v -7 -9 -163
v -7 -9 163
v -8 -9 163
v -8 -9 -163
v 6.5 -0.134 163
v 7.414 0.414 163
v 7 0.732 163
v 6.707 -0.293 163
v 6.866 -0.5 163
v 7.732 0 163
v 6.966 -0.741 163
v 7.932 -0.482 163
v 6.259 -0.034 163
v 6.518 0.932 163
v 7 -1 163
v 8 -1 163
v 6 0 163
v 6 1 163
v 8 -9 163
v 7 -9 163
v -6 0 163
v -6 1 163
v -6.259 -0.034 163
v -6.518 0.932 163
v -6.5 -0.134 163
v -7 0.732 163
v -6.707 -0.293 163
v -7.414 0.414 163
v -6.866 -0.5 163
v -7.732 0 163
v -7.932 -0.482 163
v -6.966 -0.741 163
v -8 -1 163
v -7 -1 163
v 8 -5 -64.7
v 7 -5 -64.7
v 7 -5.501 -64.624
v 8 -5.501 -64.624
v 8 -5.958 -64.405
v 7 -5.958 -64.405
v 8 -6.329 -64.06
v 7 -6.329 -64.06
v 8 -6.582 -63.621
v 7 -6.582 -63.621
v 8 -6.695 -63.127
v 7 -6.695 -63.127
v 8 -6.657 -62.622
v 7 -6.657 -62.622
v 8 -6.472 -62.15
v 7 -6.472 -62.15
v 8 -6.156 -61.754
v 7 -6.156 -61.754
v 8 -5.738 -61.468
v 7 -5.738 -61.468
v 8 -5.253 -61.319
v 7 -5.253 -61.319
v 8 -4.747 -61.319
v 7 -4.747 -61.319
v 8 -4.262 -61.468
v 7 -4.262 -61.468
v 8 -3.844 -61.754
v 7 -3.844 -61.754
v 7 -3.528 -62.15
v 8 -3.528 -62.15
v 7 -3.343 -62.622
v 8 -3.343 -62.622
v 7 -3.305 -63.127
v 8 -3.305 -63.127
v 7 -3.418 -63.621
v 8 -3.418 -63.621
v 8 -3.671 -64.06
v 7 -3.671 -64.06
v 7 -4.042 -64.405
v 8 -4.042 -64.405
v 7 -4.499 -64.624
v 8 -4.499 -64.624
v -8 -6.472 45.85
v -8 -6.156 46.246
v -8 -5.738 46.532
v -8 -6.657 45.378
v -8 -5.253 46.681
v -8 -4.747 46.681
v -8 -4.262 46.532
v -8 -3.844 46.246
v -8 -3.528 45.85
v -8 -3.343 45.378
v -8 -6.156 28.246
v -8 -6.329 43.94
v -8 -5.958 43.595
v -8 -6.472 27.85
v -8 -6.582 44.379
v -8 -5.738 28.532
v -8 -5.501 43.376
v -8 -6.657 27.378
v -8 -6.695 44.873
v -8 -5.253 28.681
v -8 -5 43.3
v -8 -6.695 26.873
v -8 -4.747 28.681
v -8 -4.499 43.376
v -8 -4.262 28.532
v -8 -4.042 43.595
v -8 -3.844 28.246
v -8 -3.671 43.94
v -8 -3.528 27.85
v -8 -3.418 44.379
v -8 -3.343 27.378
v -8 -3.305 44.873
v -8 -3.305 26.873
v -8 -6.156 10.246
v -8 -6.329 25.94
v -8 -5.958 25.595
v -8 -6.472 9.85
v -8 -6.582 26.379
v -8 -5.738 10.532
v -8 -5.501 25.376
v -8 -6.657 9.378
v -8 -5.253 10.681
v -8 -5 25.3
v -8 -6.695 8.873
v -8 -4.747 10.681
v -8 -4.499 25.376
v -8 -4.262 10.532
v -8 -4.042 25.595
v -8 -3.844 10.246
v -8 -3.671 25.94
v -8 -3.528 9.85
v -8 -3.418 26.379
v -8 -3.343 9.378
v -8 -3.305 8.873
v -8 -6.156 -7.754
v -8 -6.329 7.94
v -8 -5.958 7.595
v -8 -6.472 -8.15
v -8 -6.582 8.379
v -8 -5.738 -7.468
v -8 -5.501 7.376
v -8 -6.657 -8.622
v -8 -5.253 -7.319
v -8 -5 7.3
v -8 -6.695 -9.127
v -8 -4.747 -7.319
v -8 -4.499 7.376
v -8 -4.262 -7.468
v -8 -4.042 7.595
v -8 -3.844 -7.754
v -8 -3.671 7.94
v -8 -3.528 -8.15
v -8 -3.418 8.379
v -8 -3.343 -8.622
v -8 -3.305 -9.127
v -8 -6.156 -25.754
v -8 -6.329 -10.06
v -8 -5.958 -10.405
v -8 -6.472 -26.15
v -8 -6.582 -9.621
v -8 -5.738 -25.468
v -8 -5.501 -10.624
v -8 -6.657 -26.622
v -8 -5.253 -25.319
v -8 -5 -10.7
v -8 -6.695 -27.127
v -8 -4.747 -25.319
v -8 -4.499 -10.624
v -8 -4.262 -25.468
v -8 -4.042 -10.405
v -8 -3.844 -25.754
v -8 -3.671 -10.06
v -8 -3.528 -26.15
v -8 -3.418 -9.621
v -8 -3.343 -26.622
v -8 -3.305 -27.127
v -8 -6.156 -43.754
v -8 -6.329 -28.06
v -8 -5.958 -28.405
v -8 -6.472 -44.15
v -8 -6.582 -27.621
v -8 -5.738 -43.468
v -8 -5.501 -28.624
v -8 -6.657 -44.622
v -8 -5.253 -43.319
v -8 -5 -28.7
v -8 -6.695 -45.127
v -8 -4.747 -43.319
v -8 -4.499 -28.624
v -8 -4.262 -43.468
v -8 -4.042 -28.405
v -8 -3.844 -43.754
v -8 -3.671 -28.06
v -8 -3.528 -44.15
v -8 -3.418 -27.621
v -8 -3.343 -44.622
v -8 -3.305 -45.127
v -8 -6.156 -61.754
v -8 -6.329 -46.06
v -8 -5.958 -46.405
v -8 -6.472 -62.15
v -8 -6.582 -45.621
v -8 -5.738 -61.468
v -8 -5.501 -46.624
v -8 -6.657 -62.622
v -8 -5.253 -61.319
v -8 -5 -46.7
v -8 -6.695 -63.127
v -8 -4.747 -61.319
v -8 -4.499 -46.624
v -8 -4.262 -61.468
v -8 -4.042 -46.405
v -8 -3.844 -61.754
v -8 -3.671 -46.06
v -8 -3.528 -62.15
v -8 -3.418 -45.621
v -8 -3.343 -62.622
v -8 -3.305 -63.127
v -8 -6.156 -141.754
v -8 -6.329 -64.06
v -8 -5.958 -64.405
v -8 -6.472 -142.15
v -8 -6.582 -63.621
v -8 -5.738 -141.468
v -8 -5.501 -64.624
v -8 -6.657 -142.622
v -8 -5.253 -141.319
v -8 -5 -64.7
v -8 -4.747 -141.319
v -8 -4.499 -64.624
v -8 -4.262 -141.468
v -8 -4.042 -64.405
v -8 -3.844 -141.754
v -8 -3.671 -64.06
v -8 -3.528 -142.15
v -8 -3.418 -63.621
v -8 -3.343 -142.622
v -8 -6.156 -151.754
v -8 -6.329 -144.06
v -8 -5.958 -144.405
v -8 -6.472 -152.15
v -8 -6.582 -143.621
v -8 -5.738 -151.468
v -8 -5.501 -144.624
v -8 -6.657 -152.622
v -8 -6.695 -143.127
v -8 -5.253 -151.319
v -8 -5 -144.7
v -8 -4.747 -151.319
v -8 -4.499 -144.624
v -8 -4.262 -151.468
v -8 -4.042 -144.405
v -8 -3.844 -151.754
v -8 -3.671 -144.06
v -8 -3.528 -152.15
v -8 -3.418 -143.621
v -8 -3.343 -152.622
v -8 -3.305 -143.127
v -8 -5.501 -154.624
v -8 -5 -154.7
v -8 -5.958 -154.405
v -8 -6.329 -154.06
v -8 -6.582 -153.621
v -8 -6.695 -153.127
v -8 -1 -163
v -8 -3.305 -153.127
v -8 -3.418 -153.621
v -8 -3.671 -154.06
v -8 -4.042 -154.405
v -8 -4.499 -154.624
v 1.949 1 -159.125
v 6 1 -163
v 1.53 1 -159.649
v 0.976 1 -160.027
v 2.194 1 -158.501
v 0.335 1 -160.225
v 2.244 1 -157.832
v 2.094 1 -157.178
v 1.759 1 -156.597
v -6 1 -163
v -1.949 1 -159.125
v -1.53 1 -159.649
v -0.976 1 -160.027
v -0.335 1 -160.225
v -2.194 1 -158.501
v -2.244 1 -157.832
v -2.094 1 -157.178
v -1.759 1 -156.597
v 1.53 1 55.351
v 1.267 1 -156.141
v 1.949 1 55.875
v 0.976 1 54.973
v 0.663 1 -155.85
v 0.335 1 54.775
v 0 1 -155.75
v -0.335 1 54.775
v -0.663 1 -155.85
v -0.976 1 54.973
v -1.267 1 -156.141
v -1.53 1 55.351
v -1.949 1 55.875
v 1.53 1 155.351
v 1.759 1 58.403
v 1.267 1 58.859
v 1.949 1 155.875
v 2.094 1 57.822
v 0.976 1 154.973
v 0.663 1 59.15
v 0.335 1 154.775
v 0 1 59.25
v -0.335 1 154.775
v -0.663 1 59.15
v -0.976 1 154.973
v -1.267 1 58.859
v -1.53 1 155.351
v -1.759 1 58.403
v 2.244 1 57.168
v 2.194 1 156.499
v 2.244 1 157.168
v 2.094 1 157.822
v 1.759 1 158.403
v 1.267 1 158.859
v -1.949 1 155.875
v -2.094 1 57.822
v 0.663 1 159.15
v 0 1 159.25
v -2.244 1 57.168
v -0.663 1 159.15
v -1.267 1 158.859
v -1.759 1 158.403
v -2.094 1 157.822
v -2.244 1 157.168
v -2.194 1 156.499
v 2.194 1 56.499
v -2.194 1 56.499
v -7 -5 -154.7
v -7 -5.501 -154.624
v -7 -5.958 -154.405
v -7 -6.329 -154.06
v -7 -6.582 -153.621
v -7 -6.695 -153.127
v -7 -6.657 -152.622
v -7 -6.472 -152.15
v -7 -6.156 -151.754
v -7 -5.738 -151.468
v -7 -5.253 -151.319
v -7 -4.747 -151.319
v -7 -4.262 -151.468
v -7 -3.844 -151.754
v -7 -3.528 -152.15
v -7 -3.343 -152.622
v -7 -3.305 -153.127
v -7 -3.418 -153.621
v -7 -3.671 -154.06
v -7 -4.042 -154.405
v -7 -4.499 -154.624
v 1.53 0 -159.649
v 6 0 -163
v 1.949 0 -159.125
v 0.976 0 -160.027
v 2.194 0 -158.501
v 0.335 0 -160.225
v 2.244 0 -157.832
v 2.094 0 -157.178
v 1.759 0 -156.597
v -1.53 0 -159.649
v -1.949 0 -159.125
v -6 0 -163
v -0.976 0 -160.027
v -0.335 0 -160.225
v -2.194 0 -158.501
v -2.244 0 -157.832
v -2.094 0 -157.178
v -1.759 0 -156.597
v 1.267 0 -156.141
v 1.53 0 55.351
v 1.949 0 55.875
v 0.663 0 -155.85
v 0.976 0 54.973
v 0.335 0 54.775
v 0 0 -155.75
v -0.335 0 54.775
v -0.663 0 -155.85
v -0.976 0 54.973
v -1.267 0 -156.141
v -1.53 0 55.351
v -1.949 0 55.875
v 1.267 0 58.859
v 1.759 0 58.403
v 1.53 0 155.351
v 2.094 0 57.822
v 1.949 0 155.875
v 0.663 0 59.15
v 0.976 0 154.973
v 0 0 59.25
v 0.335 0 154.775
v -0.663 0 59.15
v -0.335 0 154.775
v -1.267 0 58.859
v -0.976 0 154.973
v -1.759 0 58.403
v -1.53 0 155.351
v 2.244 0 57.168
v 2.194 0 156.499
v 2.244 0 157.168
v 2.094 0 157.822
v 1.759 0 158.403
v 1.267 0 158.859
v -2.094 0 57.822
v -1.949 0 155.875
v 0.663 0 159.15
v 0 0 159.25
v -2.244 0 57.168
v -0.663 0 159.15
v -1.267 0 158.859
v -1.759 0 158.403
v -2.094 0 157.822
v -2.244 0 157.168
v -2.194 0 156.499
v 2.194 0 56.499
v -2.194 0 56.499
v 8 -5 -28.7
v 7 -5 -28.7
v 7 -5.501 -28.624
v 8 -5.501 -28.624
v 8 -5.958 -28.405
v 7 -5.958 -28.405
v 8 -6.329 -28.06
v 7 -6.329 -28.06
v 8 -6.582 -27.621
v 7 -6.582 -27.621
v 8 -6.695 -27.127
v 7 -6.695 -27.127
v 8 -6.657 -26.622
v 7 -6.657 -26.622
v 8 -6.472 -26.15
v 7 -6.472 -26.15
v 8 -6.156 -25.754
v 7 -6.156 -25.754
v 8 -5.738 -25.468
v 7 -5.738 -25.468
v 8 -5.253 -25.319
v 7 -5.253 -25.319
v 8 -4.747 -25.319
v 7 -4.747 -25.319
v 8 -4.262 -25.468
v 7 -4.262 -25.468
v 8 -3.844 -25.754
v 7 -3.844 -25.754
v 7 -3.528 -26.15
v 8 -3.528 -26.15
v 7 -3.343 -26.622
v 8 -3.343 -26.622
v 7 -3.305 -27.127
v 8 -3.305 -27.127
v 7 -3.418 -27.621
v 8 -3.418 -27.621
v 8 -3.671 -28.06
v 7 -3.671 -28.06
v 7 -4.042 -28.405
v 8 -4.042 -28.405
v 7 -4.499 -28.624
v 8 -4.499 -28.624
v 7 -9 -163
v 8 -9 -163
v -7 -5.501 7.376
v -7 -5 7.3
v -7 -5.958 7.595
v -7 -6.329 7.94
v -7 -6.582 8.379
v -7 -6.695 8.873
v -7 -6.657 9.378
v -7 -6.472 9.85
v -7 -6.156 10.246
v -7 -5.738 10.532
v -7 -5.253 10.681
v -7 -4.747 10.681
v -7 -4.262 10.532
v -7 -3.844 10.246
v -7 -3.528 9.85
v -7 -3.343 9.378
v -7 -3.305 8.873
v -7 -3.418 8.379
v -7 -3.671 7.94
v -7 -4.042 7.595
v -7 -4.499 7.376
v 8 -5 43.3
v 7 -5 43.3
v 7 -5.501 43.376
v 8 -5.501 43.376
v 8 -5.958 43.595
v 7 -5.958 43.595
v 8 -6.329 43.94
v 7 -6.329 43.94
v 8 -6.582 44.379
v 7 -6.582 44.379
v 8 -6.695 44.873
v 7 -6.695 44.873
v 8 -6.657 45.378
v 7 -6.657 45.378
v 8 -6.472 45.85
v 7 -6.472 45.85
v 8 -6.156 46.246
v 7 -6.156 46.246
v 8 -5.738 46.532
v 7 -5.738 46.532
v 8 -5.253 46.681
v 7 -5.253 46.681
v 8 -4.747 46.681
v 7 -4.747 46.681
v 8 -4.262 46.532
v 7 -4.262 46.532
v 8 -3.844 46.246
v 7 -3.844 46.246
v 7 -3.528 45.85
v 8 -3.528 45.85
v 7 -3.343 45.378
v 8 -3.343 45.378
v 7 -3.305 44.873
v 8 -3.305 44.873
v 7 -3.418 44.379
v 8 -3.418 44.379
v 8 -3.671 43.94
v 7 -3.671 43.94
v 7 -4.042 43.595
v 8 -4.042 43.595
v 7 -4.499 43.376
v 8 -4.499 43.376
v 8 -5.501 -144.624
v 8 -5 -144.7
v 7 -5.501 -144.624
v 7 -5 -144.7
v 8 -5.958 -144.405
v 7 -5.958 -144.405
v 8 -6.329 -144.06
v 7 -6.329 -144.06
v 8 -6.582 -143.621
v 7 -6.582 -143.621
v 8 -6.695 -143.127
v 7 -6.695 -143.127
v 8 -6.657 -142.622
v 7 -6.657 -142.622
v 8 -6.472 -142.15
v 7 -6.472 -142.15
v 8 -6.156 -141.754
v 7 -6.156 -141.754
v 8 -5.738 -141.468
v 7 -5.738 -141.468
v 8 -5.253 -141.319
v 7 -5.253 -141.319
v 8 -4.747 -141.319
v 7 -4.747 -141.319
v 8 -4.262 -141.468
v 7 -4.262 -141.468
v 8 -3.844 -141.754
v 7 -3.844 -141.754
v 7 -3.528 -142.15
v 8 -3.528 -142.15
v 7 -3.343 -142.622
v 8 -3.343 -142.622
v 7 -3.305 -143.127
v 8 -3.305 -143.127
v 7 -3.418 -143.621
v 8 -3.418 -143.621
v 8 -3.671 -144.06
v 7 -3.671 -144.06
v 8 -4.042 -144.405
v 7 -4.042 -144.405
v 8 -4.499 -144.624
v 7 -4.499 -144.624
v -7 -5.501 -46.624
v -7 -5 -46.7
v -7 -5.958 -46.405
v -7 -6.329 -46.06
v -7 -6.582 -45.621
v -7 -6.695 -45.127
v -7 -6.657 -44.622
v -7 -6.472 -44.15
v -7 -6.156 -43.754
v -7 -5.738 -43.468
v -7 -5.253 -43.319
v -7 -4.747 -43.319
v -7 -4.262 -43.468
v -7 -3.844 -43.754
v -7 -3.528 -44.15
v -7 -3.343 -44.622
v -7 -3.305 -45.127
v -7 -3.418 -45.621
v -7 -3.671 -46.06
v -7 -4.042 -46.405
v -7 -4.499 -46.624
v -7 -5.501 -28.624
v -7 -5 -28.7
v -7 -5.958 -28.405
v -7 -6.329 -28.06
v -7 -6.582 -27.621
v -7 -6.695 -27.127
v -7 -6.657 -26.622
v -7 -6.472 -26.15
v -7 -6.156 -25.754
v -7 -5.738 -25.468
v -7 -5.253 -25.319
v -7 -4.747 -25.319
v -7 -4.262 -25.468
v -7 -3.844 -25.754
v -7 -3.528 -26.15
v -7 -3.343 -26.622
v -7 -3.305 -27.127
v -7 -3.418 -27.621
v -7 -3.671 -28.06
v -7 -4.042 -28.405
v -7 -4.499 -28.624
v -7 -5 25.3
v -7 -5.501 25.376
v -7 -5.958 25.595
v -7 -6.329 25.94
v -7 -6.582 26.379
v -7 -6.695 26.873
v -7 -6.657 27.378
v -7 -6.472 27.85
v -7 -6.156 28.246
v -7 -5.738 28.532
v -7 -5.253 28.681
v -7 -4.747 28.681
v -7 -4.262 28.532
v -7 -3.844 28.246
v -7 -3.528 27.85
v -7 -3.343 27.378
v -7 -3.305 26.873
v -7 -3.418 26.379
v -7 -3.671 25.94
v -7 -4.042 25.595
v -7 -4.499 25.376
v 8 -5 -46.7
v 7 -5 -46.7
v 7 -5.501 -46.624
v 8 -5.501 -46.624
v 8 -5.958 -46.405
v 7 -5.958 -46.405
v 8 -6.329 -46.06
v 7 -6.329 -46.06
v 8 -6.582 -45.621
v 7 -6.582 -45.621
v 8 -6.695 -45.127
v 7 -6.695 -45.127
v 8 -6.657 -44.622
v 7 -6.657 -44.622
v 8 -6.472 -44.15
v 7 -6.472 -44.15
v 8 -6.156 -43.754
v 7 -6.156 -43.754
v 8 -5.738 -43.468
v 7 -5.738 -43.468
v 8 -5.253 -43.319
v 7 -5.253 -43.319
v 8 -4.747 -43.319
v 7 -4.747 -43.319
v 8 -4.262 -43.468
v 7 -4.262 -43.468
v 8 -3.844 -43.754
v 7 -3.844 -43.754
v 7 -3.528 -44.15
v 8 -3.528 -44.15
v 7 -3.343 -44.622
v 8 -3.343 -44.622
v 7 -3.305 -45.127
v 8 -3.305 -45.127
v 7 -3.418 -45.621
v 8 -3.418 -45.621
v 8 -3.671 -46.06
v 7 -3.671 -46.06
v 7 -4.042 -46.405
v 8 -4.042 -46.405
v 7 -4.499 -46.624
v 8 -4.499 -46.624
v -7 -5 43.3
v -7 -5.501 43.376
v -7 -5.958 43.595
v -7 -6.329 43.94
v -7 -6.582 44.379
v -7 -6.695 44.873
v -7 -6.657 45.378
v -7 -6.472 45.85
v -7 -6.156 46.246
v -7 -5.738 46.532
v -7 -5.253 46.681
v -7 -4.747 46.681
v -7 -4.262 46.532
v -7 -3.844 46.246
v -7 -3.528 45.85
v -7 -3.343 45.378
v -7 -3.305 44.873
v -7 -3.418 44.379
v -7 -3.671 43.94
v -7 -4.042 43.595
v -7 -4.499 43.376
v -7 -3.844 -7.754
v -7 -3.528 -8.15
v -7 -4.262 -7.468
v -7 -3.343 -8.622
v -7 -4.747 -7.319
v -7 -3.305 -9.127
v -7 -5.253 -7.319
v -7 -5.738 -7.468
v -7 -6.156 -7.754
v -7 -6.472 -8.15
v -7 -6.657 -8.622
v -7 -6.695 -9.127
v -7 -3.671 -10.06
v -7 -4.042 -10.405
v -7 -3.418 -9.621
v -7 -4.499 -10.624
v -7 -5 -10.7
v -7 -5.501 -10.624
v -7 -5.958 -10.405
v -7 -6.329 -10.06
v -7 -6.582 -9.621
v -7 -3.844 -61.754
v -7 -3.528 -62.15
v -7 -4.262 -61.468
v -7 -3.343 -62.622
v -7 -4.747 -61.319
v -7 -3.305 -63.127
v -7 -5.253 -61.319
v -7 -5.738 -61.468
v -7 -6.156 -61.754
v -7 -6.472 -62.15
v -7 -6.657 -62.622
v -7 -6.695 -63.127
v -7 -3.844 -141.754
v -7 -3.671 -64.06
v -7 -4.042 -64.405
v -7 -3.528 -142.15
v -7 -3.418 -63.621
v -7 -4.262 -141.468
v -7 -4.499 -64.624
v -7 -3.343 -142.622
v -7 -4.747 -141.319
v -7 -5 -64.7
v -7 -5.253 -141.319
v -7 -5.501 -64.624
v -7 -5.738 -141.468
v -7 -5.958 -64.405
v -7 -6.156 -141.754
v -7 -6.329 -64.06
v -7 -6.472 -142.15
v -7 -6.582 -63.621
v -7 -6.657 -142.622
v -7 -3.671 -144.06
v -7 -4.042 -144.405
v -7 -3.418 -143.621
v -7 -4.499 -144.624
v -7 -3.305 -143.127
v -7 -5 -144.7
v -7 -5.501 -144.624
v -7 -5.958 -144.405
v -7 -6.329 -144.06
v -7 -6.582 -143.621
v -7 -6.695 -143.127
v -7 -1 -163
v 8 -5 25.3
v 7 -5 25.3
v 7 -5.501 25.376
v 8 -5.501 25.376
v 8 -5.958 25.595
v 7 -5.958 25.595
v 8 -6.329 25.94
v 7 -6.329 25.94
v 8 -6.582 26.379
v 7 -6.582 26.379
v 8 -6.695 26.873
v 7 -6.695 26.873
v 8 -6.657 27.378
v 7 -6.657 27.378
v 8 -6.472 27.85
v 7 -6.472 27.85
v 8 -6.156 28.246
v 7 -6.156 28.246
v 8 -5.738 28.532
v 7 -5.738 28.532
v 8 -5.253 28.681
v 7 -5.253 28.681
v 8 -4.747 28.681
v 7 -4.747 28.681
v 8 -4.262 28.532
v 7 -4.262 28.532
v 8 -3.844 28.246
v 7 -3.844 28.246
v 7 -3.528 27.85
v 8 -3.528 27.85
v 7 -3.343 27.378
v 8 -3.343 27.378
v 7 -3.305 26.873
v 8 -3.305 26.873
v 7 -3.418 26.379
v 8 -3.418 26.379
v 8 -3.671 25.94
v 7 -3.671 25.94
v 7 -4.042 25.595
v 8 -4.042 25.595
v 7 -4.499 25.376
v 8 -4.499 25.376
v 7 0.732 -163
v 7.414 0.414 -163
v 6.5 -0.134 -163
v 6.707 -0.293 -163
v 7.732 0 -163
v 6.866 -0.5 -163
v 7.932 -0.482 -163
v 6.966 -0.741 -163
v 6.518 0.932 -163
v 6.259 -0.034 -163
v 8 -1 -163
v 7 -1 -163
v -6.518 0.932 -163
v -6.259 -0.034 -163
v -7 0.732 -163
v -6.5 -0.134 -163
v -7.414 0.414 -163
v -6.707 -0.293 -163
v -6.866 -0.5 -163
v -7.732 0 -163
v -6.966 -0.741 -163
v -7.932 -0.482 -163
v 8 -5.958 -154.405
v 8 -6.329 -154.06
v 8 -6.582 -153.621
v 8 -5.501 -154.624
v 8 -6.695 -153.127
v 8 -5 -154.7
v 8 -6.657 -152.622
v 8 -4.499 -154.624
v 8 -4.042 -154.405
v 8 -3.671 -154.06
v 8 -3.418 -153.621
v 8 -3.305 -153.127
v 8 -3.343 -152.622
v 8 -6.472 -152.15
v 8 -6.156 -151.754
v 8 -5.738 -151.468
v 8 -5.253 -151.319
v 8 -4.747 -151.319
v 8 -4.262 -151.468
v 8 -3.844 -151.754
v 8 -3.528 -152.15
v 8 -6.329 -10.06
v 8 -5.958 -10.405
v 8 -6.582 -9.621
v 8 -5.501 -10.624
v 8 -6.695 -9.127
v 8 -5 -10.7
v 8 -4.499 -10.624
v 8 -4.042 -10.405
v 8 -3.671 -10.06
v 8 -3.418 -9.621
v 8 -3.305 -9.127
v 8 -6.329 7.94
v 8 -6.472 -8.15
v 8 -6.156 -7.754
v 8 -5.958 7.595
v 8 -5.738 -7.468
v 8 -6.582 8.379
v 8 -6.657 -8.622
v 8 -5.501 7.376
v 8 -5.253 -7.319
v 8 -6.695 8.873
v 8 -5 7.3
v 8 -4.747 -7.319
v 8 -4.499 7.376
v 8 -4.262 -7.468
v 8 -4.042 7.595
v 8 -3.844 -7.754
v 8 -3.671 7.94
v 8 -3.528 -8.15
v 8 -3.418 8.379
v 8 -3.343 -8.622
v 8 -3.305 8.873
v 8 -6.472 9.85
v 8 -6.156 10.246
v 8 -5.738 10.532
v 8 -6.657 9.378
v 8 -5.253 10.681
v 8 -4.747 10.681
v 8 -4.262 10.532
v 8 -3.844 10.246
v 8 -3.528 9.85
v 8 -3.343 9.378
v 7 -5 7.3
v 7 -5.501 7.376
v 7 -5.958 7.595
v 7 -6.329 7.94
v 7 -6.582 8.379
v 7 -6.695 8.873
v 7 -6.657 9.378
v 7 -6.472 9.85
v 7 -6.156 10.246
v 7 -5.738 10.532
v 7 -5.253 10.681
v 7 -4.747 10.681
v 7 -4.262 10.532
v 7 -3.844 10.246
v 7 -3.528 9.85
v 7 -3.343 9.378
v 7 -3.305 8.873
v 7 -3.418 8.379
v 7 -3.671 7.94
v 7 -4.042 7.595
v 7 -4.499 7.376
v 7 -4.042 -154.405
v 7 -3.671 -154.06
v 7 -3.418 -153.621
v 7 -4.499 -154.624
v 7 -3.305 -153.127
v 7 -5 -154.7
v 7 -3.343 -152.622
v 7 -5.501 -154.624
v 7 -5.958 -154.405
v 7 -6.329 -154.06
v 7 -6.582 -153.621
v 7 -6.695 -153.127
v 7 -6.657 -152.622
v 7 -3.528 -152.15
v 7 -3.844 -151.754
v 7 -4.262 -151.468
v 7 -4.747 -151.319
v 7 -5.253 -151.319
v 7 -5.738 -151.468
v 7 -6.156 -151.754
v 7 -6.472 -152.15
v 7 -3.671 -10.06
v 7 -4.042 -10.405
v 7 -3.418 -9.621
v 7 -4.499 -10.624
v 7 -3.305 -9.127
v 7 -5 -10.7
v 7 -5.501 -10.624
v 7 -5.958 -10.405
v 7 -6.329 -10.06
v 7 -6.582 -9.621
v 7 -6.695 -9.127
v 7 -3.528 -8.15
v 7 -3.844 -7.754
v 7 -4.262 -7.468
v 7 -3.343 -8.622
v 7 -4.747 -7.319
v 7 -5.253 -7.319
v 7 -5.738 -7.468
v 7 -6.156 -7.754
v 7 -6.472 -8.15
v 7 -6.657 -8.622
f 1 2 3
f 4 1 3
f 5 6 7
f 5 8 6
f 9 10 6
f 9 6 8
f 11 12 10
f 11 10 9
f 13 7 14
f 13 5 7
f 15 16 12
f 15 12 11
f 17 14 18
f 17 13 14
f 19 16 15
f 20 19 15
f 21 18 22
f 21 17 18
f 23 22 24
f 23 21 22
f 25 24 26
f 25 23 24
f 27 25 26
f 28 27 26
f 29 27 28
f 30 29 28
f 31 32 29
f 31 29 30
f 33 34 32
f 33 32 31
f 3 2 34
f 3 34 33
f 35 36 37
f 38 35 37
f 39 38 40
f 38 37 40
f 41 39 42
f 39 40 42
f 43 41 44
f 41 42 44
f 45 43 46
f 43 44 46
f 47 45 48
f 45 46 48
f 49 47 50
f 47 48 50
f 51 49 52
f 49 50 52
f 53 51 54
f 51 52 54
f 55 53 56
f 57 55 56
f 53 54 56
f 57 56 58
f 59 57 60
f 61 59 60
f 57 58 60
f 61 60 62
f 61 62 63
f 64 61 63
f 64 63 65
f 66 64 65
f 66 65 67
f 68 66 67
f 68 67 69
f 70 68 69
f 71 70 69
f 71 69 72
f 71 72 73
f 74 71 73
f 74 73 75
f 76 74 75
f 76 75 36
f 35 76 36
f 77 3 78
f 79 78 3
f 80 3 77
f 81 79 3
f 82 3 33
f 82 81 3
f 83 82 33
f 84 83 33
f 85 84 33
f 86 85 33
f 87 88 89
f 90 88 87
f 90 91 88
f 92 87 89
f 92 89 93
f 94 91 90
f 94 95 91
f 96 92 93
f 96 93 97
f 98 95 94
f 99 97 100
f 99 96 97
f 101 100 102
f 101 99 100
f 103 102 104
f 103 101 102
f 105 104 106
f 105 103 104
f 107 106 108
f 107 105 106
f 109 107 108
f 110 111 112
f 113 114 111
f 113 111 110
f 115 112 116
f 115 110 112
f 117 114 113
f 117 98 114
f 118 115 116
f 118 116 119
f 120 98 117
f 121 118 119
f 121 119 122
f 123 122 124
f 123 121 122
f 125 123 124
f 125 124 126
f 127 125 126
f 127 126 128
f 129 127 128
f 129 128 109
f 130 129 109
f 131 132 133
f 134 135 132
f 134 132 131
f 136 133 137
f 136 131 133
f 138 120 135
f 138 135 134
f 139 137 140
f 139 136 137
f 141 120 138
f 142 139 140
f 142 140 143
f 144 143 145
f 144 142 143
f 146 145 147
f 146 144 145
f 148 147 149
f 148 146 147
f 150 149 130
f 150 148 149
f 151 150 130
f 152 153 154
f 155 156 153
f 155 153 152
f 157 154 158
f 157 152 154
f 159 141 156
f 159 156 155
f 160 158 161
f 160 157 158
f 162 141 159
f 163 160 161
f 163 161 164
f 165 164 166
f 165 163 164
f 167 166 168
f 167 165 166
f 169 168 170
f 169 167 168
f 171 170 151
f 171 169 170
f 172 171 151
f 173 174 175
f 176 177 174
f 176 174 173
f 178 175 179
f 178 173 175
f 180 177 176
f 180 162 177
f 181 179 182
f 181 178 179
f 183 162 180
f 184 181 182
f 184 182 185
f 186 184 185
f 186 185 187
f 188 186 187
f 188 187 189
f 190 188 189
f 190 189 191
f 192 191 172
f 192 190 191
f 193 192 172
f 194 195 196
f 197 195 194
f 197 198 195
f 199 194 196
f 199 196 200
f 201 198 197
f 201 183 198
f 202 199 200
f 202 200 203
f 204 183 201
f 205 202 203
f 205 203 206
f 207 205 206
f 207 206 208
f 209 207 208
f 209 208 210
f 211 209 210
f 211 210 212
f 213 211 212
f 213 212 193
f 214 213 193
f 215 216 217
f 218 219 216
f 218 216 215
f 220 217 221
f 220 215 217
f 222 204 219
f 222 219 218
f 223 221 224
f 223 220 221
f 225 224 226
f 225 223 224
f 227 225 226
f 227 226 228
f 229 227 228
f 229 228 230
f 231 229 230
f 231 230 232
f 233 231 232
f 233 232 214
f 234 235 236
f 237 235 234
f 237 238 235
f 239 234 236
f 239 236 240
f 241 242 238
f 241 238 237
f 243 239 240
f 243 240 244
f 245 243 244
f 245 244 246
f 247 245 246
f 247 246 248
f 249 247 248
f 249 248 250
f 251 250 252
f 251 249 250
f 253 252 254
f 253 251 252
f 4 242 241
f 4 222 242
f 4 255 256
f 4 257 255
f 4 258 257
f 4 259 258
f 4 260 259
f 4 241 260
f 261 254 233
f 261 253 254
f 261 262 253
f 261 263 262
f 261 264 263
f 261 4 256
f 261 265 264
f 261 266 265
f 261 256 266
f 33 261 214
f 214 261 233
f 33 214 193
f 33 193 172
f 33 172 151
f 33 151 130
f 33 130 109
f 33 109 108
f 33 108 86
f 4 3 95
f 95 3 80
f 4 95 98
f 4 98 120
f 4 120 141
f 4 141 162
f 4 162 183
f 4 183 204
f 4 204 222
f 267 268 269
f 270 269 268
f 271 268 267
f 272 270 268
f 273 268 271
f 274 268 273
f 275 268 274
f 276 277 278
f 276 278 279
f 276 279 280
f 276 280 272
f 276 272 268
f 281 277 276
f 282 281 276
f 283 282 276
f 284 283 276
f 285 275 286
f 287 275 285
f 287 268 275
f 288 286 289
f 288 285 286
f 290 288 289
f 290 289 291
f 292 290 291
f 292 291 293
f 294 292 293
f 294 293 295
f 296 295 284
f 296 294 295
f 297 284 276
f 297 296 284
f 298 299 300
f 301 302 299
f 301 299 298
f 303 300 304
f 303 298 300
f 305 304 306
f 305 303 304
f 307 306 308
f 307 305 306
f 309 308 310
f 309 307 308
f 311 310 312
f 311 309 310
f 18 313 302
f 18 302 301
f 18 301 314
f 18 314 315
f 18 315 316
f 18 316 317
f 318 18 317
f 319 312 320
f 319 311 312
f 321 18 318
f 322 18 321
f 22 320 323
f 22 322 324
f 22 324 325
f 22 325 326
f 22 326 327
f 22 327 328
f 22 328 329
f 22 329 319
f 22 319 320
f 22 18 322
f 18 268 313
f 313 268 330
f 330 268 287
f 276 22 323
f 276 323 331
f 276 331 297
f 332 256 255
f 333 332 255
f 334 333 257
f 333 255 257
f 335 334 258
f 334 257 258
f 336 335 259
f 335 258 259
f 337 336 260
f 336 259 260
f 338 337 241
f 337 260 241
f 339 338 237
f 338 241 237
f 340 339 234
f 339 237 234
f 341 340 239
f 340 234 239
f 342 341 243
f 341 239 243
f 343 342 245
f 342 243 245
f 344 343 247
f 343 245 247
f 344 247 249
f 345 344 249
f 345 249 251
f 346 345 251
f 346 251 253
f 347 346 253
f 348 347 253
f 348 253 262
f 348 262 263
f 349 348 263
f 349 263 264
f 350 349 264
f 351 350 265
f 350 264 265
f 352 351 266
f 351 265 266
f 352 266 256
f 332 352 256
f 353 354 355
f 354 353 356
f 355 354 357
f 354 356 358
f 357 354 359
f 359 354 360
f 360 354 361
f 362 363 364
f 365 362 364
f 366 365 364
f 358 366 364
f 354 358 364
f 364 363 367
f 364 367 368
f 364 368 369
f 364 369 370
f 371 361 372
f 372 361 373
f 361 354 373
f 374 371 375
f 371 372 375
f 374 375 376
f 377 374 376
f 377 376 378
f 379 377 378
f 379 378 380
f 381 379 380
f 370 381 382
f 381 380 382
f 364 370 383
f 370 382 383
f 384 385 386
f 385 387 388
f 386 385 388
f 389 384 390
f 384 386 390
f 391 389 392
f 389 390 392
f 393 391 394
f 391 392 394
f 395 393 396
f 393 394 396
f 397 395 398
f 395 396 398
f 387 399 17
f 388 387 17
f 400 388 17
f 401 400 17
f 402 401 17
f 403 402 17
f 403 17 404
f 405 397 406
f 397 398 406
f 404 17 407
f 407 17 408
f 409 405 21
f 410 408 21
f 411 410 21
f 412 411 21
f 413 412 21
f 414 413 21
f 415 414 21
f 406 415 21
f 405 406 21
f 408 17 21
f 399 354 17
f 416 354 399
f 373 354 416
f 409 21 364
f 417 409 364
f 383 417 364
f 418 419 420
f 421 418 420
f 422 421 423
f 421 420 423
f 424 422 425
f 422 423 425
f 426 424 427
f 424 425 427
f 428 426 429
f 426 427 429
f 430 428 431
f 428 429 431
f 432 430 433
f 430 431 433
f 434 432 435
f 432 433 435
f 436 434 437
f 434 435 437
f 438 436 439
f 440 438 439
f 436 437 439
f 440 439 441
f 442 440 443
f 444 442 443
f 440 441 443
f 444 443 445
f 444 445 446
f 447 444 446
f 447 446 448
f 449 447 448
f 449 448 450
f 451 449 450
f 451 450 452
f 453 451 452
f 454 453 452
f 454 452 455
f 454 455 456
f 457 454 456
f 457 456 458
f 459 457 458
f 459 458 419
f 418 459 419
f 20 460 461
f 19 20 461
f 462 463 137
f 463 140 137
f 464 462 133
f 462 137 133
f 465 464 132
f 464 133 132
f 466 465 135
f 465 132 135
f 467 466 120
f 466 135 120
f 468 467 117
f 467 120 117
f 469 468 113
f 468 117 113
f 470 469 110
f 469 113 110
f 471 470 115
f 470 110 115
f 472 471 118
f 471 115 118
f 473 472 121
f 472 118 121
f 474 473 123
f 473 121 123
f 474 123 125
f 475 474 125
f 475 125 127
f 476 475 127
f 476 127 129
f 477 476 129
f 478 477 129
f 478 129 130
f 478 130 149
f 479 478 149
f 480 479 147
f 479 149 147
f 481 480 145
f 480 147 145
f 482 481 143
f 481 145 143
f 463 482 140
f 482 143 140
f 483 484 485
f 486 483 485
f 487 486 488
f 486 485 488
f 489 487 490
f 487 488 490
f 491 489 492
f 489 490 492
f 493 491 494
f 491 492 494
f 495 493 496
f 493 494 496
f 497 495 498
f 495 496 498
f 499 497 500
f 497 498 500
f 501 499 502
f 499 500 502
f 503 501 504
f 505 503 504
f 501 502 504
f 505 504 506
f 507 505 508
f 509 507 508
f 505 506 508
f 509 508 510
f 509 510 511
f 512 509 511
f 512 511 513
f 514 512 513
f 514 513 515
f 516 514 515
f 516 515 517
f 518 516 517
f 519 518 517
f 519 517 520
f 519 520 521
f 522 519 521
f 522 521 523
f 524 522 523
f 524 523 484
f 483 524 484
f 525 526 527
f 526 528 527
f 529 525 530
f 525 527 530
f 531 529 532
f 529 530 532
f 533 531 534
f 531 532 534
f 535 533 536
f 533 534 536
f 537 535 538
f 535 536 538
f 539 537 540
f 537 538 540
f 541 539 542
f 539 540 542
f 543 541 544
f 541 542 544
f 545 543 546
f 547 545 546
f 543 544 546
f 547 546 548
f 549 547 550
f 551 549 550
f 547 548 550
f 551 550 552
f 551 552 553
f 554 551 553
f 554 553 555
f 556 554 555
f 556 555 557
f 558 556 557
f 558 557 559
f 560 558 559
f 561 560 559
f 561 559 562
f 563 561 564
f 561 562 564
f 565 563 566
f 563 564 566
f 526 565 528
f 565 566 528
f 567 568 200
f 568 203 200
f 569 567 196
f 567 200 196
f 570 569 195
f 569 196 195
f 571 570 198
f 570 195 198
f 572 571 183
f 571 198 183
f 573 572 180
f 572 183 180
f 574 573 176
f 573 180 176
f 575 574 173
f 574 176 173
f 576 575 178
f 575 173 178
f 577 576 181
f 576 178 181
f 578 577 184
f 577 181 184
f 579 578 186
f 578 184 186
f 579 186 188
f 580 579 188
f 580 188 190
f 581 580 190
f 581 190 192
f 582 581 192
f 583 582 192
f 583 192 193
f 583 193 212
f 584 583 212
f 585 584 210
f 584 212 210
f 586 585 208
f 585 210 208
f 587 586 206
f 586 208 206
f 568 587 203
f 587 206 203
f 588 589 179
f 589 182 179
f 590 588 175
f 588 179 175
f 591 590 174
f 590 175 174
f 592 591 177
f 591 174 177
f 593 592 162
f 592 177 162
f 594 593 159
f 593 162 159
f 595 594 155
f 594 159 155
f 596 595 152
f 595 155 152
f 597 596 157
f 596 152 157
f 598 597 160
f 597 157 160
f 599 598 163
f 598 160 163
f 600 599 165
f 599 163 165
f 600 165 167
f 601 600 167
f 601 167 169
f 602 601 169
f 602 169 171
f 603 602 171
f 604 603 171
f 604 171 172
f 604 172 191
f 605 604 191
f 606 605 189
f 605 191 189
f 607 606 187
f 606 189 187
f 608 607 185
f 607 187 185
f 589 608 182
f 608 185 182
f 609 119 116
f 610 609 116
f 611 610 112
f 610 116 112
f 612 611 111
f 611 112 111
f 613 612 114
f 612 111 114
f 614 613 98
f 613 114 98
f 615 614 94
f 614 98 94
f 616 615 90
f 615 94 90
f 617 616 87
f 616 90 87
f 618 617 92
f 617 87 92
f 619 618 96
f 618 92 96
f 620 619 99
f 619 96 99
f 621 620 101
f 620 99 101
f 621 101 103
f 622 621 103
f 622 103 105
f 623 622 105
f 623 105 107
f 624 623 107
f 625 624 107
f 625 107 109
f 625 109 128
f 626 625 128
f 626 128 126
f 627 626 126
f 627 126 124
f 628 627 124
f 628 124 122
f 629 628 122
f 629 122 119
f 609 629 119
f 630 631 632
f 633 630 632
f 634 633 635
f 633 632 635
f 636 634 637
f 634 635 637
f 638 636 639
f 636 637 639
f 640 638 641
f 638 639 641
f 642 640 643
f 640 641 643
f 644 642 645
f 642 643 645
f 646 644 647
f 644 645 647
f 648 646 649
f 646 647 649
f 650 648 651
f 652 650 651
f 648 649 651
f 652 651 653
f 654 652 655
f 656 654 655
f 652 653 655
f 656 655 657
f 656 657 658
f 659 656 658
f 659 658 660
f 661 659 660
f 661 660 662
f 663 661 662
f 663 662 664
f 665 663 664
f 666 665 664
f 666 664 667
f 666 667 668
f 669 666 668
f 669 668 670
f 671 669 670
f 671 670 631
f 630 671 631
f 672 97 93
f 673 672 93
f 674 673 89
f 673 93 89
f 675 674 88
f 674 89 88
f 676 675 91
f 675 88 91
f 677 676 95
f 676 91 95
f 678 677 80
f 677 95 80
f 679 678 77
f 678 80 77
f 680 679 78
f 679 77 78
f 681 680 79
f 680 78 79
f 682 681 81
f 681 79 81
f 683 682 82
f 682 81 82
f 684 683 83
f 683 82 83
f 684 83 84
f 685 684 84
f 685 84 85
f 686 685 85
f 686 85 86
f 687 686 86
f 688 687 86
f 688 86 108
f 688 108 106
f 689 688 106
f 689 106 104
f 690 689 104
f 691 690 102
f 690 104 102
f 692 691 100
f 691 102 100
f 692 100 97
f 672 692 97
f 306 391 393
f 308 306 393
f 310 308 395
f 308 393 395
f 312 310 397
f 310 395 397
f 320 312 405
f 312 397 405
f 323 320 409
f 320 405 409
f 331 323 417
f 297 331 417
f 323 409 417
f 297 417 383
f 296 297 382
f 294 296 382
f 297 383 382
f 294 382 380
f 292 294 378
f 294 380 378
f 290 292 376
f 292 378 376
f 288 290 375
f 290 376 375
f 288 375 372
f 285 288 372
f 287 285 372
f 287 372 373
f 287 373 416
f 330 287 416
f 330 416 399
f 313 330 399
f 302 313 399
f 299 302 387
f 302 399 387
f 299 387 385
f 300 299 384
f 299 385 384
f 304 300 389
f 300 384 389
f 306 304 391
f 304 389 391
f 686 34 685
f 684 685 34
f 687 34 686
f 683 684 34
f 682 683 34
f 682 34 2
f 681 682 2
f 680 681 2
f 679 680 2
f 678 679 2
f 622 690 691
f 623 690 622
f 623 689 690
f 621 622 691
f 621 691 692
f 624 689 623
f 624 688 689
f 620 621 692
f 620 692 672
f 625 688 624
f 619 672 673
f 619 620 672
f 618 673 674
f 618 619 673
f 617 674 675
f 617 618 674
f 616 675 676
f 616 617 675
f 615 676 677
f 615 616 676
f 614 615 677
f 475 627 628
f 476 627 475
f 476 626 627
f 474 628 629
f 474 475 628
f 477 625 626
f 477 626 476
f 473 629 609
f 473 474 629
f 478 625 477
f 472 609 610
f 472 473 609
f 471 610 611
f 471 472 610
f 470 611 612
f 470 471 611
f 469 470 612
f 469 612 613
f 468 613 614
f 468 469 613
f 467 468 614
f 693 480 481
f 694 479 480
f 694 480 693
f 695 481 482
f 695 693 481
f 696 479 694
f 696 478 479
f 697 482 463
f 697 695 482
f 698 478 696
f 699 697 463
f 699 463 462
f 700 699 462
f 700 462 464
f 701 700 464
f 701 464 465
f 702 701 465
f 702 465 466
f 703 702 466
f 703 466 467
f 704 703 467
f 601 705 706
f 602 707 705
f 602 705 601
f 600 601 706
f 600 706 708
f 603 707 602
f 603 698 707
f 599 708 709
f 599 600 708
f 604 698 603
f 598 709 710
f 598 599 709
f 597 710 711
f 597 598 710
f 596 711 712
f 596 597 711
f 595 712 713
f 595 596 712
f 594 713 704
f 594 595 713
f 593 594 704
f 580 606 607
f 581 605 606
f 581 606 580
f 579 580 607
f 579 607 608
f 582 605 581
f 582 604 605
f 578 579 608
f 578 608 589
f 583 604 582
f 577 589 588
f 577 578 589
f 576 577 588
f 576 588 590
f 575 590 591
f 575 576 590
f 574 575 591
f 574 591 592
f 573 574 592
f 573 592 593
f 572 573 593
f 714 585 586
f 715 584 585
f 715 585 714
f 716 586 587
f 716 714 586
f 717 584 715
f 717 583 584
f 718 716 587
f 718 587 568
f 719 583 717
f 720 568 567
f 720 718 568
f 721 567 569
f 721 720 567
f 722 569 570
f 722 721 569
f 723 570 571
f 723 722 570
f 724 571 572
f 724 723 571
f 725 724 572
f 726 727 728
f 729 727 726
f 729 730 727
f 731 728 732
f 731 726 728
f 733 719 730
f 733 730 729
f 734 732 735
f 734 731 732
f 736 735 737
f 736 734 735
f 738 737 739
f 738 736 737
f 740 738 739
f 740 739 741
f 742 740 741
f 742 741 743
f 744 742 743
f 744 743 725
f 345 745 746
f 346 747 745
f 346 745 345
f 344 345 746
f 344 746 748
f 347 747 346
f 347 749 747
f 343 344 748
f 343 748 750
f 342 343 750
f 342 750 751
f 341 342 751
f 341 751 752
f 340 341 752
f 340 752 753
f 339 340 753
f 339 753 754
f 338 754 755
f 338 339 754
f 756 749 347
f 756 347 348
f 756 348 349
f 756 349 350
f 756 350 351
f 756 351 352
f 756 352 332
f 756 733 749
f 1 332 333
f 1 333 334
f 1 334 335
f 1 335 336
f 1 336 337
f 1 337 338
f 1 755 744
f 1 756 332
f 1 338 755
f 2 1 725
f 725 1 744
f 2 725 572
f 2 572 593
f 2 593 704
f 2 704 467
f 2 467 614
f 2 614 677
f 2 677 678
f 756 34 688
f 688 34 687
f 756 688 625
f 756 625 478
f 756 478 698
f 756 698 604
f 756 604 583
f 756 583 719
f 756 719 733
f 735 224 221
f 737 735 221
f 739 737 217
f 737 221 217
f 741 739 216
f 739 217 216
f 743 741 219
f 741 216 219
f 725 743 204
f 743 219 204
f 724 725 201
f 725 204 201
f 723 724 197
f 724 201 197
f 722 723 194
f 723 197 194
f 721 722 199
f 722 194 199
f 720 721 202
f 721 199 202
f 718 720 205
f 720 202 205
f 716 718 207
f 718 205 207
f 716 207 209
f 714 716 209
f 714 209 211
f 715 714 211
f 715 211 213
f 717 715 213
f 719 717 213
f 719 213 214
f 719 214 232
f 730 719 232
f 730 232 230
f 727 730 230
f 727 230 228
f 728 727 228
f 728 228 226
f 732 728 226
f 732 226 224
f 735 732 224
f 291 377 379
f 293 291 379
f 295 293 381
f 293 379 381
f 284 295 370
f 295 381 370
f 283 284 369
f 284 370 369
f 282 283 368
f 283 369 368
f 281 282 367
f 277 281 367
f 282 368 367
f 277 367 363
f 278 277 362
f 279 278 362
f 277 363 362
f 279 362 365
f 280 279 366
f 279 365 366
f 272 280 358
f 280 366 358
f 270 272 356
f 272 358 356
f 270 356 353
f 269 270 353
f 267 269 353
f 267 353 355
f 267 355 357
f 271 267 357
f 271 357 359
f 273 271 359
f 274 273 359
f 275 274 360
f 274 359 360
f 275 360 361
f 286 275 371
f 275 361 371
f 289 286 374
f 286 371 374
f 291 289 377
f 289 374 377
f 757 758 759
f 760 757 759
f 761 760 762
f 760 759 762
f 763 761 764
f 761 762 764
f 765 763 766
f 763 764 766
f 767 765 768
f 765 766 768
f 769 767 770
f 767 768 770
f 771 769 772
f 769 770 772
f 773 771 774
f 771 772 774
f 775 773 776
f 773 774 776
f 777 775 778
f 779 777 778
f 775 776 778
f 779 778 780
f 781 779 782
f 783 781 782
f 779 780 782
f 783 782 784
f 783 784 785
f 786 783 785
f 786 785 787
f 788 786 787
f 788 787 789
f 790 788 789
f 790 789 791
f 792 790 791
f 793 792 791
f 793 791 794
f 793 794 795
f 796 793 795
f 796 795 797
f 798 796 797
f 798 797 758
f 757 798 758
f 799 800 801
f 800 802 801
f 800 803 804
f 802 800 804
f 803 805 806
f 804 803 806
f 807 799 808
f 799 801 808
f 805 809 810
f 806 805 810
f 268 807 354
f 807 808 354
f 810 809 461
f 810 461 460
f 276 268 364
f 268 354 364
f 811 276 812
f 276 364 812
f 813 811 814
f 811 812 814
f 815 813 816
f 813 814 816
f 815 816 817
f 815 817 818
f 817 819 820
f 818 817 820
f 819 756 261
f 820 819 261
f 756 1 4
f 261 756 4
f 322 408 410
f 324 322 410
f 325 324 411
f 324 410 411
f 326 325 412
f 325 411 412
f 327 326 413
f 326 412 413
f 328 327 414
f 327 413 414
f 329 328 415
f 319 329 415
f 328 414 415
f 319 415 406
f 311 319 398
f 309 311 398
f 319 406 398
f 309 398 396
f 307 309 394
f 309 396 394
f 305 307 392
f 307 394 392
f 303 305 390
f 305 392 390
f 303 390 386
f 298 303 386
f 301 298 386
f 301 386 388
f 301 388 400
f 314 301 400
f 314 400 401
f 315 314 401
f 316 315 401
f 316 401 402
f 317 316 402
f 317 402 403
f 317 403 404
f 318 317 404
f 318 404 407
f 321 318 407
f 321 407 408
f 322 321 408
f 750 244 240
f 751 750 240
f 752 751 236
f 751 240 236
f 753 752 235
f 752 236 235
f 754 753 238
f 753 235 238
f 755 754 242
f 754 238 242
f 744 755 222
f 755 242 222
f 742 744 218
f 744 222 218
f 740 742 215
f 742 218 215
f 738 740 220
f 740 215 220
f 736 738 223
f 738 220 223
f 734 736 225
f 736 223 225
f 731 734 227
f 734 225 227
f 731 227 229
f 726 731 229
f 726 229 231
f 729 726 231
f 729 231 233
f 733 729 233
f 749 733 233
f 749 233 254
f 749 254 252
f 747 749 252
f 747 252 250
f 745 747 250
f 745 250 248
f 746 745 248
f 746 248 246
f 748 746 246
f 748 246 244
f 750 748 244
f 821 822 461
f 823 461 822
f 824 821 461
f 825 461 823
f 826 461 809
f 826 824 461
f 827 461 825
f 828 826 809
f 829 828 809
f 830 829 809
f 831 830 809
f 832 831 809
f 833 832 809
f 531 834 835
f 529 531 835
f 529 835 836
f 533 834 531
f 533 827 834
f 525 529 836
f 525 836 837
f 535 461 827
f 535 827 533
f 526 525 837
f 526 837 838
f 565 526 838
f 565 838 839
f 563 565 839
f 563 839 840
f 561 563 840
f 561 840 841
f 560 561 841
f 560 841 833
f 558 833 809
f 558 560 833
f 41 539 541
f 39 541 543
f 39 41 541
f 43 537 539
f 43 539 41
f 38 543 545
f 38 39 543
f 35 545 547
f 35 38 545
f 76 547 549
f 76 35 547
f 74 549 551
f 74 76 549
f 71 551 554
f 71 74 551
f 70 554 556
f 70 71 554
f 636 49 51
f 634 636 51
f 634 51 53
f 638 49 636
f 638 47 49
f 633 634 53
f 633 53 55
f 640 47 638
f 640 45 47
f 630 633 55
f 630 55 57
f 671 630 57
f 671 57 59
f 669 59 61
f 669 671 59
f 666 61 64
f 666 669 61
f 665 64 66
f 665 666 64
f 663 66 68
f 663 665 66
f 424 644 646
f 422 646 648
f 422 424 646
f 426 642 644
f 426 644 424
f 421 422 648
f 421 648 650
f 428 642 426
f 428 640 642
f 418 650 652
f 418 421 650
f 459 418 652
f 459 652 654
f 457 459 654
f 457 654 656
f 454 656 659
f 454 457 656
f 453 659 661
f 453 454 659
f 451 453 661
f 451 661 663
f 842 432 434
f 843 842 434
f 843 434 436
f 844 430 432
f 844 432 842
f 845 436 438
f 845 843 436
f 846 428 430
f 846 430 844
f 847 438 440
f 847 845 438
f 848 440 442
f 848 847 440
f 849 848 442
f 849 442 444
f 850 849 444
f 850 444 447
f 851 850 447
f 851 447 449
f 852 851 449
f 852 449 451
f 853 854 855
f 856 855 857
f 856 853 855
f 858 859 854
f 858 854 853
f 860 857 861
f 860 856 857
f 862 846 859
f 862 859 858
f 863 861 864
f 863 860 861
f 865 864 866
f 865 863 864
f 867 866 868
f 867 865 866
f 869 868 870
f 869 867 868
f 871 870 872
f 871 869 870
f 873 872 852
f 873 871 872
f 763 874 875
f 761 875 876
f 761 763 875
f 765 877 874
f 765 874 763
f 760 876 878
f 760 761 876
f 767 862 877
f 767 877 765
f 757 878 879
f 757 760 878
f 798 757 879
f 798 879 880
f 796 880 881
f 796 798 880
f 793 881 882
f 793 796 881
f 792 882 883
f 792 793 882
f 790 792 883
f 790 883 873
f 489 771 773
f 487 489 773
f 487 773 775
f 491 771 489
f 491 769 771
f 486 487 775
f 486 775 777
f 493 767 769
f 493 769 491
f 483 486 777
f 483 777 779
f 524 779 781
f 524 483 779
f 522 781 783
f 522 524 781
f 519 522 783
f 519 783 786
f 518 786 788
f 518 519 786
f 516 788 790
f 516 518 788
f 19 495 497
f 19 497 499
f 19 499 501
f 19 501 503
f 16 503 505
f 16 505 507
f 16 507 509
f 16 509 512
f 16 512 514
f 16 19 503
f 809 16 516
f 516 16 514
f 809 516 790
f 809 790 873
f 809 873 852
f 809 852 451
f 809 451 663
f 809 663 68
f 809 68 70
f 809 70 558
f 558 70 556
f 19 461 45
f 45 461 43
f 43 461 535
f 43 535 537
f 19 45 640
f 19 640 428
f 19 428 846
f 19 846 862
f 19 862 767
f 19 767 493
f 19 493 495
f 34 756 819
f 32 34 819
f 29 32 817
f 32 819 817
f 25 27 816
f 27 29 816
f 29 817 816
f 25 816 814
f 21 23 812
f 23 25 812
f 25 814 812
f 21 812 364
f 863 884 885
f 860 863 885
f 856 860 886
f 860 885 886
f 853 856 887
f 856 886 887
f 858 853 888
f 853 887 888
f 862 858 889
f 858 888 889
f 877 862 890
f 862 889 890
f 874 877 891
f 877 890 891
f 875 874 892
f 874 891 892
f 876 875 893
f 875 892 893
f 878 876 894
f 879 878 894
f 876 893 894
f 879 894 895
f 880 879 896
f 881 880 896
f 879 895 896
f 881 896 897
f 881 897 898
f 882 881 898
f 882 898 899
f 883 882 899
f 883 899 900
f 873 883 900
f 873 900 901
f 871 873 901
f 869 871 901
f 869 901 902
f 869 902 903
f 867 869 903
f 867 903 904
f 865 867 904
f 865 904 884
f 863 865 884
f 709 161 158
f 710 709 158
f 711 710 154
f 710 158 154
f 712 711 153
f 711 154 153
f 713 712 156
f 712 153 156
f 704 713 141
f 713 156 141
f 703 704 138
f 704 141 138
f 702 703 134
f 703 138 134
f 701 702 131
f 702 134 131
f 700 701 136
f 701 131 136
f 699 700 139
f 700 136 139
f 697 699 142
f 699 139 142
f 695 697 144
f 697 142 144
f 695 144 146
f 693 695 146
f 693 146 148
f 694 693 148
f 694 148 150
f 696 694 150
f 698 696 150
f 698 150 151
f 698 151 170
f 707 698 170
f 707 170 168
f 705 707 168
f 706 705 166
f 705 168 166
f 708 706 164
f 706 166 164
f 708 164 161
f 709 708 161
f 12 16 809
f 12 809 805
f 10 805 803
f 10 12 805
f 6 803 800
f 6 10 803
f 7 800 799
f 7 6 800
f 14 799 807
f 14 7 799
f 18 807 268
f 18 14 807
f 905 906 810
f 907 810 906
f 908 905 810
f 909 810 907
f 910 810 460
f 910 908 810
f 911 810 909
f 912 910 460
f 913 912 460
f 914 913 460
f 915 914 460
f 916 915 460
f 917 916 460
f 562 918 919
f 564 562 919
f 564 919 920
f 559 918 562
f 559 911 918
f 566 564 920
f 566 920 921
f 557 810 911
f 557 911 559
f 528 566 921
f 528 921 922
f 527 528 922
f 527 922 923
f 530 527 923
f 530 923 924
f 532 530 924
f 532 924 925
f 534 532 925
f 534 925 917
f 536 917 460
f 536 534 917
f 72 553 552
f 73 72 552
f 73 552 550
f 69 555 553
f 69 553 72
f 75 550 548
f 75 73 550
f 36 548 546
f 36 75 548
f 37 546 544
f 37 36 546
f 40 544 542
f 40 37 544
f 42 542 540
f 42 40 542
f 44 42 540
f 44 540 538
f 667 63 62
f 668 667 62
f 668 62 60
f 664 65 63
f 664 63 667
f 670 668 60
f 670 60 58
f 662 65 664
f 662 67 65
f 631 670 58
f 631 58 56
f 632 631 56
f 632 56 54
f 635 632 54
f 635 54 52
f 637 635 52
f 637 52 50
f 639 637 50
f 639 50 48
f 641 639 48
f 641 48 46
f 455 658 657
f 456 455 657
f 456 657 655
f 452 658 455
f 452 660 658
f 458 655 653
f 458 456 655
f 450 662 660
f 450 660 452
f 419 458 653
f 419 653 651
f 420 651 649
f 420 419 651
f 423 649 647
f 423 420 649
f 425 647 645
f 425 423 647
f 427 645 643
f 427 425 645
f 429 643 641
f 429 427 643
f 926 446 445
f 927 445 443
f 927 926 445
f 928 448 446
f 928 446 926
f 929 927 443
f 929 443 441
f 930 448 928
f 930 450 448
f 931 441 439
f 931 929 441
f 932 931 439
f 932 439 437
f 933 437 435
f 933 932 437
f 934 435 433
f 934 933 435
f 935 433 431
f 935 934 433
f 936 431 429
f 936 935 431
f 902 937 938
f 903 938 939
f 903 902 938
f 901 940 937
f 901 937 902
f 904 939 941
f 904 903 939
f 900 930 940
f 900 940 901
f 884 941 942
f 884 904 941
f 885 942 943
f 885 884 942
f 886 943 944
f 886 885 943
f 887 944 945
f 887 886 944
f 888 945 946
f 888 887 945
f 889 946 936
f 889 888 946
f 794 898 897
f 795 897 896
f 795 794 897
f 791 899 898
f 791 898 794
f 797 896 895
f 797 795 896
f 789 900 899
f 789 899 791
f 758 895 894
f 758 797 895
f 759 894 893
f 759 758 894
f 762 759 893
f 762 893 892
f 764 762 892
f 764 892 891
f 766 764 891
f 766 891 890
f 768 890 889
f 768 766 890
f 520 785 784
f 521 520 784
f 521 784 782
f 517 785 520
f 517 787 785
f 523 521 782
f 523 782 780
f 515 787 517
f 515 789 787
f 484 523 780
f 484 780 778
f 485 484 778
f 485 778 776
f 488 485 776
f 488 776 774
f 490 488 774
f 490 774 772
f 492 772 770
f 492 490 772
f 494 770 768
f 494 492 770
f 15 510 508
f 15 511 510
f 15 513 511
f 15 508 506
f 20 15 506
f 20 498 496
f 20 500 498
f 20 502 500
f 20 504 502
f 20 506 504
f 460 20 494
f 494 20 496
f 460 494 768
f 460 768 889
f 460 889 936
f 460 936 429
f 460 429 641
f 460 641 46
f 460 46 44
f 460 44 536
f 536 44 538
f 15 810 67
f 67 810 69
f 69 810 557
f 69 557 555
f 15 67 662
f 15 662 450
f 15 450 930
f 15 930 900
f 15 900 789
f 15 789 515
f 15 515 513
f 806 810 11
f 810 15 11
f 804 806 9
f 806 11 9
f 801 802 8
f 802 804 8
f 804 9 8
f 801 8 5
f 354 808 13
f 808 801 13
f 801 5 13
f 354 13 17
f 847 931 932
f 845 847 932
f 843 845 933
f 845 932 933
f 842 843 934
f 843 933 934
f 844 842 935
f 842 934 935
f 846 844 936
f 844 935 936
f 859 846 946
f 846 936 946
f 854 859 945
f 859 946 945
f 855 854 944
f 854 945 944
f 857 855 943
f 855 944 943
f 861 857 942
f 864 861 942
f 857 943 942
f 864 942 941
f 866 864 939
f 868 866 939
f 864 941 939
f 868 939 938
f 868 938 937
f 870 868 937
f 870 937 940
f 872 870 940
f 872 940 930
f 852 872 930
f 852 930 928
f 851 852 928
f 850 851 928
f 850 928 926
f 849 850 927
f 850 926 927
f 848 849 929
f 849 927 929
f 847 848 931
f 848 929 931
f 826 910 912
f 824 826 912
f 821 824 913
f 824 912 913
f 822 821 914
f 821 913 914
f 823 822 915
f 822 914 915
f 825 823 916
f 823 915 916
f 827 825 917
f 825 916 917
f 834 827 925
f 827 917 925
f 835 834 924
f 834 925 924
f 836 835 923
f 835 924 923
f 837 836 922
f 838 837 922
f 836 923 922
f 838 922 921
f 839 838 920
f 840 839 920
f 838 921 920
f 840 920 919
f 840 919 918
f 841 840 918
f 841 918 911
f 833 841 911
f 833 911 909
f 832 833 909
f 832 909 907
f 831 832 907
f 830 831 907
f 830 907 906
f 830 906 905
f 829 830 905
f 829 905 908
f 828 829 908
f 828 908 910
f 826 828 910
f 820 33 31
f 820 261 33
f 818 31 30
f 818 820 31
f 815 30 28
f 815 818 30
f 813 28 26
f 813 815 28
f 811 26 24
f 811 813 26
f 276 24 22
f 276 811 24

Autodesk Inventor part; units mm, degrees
ref_plane "YZ Plane" through (0, 0, 0) normal (1, 0, 0) x (0, 1, 0)
ref_plane "XZ Plane" through (0, 0, 0) normal (0, 1, 0) x (-1, 0, 0)
ref_plane "XY Plane" through (0, 0, 0) normal (0, 0, 1) x (1, 0, 0)
sketch "Esquisse4" plane through (0, 0, 0) normal (0, 1, 0) x (-1, 0, 0)
  line L0 (-8, 163) -> (8, 163)
  line L1 (8, 163) -> (8, -163)
  line L2 (8, -163) -> (-8, -163)
  line L3 (-8, -163) -> (-8, 163)
  line L4 (-8, 163) -> (8, -163) construction
  line L5 (8, 163) -> (-8, -163) construction
  point P0 (0, 0)
  dimension "d26" = 16
  dimension "d27" = 326
extrude "Plaque3" add sketch "Esquisse4" along normal blind 1
sketch "Esquisse5" plane through (7, 1, 163) normal (1, 0, 0) x (0, 1, 0)
  line L0 (0, -326) -> (0, 0)
  line L1 (0, 0) -> (-10, 0)
  line L2 (-10, 0) -> (-10, -326)
  line L3 (-10, -326) -> (0, -326)
edge flange "Bord tombé2" height 10 angle 90 thickness 1 bend radius 1 thickness toward (1, 0, 0) relief tear relief width 1 relief depth 0.5 corner gap 1 corner form 0 edges at (8, 0, 0) (-8, 0, 0) wall of the first edge with corners at (7, 1, -163) (7, 1, 163) (7, -9, 163) (7, -9, -163)
bend "Pli2"
corner "Coin2"
sketch "Esquisse6" plane through (0, 1, 0) normal (0, 1, 0) x (1, 0, 0)
  line L0 (-6, 163) -> (6, 163) projected
  point P0 (0, 0)
  point P1 (0, 158)
  point P2 (0, 163)
  dimension "d39" = 5
hole "Perçage2" at (0, 1, -158) direction (0, -1, 0) diameter 4.5 depth 1 clearance for "Vis d'assemblage à six pans creux ISO 4762" size "M4" standard "ISO"
sketch "Esquisse7" plane through (0, 1, 0) normal (0, 1, 0) x (1, 0, 0)
  line L0 (-6, 163) -> (6, 163) projected
  point P0 (0, 0)
  point P1 (0, -57)
  point P2 (0, -157)
  dimension "d50" = 220
  dimension "d51" = 100
hole "Perçage3" at (0, 1, 57) at (0, 1, 157) direction (0, -1, 0) diameter 4.5 depth 1 clearance for "Vis d'assemblage à six pans creux ISO 4762" size "M4" standard "ISO"
sketch "Esquisse8" plane through (8, -9, 163) normal (1, 0, 0) x (0, 0, -1)
  line L0 (326, 8) -> (0, 8) projected
  line L1 (0, 0) -> (0, 8) projected
  line L2 (326, 0) -> (0, 0) projected
  line L3 (326, 8) -> (326, 0) projected
  line L4 (326, 8) -> (326, 0) projected
  point P0 (163, 9)
  point P1 (326, 4)
  point P2 (326, 4)
  point P3 (316, 4)
  point P4 (326, 4)
  point P5 (306, 4)
  dimension "d60" = 10
  dimension "d71" = 10
hole "Perçage4" at (8, -5, -153) at (8, -5, -143) direction (-1, 0, 0) diameter 3.4 depth 16 clearance for "Vis d'assemblage à six pans creux ISO 4762" size "M3" standard "ISO"
sketch "Esquisse9" plane through (8, -9, 163) normal (1, 0, 0) x (0, 0, -1)
  line L0 (326, 8) -> (326, 0) projected
  point P0 (163, 9)
  point P1 (226, 4)
  point P2 (326, 4)
  dimension "d72" = 100
hole "Perçage5" at (8, -5, -63) direction (-1, 0, 0) diameter 3.4 depth 16 clearance for "Vis d'assemblage à six pans creux ISO 4762" size "M3" standard "ISO"
pattern_linear "Réseau rectangulaire2" count 7 spacing 18 along (0, 0, 1) of "Perçage5"
equation "\"d45\" = Epaisseur"
equation "\"d57\" = Epaisseur"
equation "\"d66\" = Epaisseur"
equation "\"d78\" = Epaisseur"
equation "\"d28\" = Epaisseur"
equation "\"d29\" = LargeurGrugeage"
equation "\"d30\" = ProfondeurGrugeage"
equation "\"d31\" = RestesMinimum"
equation "\"d32\" = Rayondetransition"
equation "\"d35\" = RayonPli"
equation "\"d36\" = TailleGrugeage"
equation "\"d37\" = TailleJeu"
equation "\"d38\" = TailleRayonJacobi"
equation "\"RayonPli\" = Epaisseur"
equation "\"LargeurGrugeage\" = Epaisseur"
equation "\"ProfondeurGrugeage\" = 0.5 * Epaisseur"
equation "\"TailleGrugeage\" = 4 * Epaisseur"
equation "\"RestesMinimum\" = 2 * Epaisseur"
equation "\"Rayondetransition\" = RayonPli"
equation "\"TailleRayonJacobi\" = RayonPli"
equation "\"TailleJeu\" = Epaisseur"
equation "\"Epaisseur\" = 1"
properties part number "support_principal"
